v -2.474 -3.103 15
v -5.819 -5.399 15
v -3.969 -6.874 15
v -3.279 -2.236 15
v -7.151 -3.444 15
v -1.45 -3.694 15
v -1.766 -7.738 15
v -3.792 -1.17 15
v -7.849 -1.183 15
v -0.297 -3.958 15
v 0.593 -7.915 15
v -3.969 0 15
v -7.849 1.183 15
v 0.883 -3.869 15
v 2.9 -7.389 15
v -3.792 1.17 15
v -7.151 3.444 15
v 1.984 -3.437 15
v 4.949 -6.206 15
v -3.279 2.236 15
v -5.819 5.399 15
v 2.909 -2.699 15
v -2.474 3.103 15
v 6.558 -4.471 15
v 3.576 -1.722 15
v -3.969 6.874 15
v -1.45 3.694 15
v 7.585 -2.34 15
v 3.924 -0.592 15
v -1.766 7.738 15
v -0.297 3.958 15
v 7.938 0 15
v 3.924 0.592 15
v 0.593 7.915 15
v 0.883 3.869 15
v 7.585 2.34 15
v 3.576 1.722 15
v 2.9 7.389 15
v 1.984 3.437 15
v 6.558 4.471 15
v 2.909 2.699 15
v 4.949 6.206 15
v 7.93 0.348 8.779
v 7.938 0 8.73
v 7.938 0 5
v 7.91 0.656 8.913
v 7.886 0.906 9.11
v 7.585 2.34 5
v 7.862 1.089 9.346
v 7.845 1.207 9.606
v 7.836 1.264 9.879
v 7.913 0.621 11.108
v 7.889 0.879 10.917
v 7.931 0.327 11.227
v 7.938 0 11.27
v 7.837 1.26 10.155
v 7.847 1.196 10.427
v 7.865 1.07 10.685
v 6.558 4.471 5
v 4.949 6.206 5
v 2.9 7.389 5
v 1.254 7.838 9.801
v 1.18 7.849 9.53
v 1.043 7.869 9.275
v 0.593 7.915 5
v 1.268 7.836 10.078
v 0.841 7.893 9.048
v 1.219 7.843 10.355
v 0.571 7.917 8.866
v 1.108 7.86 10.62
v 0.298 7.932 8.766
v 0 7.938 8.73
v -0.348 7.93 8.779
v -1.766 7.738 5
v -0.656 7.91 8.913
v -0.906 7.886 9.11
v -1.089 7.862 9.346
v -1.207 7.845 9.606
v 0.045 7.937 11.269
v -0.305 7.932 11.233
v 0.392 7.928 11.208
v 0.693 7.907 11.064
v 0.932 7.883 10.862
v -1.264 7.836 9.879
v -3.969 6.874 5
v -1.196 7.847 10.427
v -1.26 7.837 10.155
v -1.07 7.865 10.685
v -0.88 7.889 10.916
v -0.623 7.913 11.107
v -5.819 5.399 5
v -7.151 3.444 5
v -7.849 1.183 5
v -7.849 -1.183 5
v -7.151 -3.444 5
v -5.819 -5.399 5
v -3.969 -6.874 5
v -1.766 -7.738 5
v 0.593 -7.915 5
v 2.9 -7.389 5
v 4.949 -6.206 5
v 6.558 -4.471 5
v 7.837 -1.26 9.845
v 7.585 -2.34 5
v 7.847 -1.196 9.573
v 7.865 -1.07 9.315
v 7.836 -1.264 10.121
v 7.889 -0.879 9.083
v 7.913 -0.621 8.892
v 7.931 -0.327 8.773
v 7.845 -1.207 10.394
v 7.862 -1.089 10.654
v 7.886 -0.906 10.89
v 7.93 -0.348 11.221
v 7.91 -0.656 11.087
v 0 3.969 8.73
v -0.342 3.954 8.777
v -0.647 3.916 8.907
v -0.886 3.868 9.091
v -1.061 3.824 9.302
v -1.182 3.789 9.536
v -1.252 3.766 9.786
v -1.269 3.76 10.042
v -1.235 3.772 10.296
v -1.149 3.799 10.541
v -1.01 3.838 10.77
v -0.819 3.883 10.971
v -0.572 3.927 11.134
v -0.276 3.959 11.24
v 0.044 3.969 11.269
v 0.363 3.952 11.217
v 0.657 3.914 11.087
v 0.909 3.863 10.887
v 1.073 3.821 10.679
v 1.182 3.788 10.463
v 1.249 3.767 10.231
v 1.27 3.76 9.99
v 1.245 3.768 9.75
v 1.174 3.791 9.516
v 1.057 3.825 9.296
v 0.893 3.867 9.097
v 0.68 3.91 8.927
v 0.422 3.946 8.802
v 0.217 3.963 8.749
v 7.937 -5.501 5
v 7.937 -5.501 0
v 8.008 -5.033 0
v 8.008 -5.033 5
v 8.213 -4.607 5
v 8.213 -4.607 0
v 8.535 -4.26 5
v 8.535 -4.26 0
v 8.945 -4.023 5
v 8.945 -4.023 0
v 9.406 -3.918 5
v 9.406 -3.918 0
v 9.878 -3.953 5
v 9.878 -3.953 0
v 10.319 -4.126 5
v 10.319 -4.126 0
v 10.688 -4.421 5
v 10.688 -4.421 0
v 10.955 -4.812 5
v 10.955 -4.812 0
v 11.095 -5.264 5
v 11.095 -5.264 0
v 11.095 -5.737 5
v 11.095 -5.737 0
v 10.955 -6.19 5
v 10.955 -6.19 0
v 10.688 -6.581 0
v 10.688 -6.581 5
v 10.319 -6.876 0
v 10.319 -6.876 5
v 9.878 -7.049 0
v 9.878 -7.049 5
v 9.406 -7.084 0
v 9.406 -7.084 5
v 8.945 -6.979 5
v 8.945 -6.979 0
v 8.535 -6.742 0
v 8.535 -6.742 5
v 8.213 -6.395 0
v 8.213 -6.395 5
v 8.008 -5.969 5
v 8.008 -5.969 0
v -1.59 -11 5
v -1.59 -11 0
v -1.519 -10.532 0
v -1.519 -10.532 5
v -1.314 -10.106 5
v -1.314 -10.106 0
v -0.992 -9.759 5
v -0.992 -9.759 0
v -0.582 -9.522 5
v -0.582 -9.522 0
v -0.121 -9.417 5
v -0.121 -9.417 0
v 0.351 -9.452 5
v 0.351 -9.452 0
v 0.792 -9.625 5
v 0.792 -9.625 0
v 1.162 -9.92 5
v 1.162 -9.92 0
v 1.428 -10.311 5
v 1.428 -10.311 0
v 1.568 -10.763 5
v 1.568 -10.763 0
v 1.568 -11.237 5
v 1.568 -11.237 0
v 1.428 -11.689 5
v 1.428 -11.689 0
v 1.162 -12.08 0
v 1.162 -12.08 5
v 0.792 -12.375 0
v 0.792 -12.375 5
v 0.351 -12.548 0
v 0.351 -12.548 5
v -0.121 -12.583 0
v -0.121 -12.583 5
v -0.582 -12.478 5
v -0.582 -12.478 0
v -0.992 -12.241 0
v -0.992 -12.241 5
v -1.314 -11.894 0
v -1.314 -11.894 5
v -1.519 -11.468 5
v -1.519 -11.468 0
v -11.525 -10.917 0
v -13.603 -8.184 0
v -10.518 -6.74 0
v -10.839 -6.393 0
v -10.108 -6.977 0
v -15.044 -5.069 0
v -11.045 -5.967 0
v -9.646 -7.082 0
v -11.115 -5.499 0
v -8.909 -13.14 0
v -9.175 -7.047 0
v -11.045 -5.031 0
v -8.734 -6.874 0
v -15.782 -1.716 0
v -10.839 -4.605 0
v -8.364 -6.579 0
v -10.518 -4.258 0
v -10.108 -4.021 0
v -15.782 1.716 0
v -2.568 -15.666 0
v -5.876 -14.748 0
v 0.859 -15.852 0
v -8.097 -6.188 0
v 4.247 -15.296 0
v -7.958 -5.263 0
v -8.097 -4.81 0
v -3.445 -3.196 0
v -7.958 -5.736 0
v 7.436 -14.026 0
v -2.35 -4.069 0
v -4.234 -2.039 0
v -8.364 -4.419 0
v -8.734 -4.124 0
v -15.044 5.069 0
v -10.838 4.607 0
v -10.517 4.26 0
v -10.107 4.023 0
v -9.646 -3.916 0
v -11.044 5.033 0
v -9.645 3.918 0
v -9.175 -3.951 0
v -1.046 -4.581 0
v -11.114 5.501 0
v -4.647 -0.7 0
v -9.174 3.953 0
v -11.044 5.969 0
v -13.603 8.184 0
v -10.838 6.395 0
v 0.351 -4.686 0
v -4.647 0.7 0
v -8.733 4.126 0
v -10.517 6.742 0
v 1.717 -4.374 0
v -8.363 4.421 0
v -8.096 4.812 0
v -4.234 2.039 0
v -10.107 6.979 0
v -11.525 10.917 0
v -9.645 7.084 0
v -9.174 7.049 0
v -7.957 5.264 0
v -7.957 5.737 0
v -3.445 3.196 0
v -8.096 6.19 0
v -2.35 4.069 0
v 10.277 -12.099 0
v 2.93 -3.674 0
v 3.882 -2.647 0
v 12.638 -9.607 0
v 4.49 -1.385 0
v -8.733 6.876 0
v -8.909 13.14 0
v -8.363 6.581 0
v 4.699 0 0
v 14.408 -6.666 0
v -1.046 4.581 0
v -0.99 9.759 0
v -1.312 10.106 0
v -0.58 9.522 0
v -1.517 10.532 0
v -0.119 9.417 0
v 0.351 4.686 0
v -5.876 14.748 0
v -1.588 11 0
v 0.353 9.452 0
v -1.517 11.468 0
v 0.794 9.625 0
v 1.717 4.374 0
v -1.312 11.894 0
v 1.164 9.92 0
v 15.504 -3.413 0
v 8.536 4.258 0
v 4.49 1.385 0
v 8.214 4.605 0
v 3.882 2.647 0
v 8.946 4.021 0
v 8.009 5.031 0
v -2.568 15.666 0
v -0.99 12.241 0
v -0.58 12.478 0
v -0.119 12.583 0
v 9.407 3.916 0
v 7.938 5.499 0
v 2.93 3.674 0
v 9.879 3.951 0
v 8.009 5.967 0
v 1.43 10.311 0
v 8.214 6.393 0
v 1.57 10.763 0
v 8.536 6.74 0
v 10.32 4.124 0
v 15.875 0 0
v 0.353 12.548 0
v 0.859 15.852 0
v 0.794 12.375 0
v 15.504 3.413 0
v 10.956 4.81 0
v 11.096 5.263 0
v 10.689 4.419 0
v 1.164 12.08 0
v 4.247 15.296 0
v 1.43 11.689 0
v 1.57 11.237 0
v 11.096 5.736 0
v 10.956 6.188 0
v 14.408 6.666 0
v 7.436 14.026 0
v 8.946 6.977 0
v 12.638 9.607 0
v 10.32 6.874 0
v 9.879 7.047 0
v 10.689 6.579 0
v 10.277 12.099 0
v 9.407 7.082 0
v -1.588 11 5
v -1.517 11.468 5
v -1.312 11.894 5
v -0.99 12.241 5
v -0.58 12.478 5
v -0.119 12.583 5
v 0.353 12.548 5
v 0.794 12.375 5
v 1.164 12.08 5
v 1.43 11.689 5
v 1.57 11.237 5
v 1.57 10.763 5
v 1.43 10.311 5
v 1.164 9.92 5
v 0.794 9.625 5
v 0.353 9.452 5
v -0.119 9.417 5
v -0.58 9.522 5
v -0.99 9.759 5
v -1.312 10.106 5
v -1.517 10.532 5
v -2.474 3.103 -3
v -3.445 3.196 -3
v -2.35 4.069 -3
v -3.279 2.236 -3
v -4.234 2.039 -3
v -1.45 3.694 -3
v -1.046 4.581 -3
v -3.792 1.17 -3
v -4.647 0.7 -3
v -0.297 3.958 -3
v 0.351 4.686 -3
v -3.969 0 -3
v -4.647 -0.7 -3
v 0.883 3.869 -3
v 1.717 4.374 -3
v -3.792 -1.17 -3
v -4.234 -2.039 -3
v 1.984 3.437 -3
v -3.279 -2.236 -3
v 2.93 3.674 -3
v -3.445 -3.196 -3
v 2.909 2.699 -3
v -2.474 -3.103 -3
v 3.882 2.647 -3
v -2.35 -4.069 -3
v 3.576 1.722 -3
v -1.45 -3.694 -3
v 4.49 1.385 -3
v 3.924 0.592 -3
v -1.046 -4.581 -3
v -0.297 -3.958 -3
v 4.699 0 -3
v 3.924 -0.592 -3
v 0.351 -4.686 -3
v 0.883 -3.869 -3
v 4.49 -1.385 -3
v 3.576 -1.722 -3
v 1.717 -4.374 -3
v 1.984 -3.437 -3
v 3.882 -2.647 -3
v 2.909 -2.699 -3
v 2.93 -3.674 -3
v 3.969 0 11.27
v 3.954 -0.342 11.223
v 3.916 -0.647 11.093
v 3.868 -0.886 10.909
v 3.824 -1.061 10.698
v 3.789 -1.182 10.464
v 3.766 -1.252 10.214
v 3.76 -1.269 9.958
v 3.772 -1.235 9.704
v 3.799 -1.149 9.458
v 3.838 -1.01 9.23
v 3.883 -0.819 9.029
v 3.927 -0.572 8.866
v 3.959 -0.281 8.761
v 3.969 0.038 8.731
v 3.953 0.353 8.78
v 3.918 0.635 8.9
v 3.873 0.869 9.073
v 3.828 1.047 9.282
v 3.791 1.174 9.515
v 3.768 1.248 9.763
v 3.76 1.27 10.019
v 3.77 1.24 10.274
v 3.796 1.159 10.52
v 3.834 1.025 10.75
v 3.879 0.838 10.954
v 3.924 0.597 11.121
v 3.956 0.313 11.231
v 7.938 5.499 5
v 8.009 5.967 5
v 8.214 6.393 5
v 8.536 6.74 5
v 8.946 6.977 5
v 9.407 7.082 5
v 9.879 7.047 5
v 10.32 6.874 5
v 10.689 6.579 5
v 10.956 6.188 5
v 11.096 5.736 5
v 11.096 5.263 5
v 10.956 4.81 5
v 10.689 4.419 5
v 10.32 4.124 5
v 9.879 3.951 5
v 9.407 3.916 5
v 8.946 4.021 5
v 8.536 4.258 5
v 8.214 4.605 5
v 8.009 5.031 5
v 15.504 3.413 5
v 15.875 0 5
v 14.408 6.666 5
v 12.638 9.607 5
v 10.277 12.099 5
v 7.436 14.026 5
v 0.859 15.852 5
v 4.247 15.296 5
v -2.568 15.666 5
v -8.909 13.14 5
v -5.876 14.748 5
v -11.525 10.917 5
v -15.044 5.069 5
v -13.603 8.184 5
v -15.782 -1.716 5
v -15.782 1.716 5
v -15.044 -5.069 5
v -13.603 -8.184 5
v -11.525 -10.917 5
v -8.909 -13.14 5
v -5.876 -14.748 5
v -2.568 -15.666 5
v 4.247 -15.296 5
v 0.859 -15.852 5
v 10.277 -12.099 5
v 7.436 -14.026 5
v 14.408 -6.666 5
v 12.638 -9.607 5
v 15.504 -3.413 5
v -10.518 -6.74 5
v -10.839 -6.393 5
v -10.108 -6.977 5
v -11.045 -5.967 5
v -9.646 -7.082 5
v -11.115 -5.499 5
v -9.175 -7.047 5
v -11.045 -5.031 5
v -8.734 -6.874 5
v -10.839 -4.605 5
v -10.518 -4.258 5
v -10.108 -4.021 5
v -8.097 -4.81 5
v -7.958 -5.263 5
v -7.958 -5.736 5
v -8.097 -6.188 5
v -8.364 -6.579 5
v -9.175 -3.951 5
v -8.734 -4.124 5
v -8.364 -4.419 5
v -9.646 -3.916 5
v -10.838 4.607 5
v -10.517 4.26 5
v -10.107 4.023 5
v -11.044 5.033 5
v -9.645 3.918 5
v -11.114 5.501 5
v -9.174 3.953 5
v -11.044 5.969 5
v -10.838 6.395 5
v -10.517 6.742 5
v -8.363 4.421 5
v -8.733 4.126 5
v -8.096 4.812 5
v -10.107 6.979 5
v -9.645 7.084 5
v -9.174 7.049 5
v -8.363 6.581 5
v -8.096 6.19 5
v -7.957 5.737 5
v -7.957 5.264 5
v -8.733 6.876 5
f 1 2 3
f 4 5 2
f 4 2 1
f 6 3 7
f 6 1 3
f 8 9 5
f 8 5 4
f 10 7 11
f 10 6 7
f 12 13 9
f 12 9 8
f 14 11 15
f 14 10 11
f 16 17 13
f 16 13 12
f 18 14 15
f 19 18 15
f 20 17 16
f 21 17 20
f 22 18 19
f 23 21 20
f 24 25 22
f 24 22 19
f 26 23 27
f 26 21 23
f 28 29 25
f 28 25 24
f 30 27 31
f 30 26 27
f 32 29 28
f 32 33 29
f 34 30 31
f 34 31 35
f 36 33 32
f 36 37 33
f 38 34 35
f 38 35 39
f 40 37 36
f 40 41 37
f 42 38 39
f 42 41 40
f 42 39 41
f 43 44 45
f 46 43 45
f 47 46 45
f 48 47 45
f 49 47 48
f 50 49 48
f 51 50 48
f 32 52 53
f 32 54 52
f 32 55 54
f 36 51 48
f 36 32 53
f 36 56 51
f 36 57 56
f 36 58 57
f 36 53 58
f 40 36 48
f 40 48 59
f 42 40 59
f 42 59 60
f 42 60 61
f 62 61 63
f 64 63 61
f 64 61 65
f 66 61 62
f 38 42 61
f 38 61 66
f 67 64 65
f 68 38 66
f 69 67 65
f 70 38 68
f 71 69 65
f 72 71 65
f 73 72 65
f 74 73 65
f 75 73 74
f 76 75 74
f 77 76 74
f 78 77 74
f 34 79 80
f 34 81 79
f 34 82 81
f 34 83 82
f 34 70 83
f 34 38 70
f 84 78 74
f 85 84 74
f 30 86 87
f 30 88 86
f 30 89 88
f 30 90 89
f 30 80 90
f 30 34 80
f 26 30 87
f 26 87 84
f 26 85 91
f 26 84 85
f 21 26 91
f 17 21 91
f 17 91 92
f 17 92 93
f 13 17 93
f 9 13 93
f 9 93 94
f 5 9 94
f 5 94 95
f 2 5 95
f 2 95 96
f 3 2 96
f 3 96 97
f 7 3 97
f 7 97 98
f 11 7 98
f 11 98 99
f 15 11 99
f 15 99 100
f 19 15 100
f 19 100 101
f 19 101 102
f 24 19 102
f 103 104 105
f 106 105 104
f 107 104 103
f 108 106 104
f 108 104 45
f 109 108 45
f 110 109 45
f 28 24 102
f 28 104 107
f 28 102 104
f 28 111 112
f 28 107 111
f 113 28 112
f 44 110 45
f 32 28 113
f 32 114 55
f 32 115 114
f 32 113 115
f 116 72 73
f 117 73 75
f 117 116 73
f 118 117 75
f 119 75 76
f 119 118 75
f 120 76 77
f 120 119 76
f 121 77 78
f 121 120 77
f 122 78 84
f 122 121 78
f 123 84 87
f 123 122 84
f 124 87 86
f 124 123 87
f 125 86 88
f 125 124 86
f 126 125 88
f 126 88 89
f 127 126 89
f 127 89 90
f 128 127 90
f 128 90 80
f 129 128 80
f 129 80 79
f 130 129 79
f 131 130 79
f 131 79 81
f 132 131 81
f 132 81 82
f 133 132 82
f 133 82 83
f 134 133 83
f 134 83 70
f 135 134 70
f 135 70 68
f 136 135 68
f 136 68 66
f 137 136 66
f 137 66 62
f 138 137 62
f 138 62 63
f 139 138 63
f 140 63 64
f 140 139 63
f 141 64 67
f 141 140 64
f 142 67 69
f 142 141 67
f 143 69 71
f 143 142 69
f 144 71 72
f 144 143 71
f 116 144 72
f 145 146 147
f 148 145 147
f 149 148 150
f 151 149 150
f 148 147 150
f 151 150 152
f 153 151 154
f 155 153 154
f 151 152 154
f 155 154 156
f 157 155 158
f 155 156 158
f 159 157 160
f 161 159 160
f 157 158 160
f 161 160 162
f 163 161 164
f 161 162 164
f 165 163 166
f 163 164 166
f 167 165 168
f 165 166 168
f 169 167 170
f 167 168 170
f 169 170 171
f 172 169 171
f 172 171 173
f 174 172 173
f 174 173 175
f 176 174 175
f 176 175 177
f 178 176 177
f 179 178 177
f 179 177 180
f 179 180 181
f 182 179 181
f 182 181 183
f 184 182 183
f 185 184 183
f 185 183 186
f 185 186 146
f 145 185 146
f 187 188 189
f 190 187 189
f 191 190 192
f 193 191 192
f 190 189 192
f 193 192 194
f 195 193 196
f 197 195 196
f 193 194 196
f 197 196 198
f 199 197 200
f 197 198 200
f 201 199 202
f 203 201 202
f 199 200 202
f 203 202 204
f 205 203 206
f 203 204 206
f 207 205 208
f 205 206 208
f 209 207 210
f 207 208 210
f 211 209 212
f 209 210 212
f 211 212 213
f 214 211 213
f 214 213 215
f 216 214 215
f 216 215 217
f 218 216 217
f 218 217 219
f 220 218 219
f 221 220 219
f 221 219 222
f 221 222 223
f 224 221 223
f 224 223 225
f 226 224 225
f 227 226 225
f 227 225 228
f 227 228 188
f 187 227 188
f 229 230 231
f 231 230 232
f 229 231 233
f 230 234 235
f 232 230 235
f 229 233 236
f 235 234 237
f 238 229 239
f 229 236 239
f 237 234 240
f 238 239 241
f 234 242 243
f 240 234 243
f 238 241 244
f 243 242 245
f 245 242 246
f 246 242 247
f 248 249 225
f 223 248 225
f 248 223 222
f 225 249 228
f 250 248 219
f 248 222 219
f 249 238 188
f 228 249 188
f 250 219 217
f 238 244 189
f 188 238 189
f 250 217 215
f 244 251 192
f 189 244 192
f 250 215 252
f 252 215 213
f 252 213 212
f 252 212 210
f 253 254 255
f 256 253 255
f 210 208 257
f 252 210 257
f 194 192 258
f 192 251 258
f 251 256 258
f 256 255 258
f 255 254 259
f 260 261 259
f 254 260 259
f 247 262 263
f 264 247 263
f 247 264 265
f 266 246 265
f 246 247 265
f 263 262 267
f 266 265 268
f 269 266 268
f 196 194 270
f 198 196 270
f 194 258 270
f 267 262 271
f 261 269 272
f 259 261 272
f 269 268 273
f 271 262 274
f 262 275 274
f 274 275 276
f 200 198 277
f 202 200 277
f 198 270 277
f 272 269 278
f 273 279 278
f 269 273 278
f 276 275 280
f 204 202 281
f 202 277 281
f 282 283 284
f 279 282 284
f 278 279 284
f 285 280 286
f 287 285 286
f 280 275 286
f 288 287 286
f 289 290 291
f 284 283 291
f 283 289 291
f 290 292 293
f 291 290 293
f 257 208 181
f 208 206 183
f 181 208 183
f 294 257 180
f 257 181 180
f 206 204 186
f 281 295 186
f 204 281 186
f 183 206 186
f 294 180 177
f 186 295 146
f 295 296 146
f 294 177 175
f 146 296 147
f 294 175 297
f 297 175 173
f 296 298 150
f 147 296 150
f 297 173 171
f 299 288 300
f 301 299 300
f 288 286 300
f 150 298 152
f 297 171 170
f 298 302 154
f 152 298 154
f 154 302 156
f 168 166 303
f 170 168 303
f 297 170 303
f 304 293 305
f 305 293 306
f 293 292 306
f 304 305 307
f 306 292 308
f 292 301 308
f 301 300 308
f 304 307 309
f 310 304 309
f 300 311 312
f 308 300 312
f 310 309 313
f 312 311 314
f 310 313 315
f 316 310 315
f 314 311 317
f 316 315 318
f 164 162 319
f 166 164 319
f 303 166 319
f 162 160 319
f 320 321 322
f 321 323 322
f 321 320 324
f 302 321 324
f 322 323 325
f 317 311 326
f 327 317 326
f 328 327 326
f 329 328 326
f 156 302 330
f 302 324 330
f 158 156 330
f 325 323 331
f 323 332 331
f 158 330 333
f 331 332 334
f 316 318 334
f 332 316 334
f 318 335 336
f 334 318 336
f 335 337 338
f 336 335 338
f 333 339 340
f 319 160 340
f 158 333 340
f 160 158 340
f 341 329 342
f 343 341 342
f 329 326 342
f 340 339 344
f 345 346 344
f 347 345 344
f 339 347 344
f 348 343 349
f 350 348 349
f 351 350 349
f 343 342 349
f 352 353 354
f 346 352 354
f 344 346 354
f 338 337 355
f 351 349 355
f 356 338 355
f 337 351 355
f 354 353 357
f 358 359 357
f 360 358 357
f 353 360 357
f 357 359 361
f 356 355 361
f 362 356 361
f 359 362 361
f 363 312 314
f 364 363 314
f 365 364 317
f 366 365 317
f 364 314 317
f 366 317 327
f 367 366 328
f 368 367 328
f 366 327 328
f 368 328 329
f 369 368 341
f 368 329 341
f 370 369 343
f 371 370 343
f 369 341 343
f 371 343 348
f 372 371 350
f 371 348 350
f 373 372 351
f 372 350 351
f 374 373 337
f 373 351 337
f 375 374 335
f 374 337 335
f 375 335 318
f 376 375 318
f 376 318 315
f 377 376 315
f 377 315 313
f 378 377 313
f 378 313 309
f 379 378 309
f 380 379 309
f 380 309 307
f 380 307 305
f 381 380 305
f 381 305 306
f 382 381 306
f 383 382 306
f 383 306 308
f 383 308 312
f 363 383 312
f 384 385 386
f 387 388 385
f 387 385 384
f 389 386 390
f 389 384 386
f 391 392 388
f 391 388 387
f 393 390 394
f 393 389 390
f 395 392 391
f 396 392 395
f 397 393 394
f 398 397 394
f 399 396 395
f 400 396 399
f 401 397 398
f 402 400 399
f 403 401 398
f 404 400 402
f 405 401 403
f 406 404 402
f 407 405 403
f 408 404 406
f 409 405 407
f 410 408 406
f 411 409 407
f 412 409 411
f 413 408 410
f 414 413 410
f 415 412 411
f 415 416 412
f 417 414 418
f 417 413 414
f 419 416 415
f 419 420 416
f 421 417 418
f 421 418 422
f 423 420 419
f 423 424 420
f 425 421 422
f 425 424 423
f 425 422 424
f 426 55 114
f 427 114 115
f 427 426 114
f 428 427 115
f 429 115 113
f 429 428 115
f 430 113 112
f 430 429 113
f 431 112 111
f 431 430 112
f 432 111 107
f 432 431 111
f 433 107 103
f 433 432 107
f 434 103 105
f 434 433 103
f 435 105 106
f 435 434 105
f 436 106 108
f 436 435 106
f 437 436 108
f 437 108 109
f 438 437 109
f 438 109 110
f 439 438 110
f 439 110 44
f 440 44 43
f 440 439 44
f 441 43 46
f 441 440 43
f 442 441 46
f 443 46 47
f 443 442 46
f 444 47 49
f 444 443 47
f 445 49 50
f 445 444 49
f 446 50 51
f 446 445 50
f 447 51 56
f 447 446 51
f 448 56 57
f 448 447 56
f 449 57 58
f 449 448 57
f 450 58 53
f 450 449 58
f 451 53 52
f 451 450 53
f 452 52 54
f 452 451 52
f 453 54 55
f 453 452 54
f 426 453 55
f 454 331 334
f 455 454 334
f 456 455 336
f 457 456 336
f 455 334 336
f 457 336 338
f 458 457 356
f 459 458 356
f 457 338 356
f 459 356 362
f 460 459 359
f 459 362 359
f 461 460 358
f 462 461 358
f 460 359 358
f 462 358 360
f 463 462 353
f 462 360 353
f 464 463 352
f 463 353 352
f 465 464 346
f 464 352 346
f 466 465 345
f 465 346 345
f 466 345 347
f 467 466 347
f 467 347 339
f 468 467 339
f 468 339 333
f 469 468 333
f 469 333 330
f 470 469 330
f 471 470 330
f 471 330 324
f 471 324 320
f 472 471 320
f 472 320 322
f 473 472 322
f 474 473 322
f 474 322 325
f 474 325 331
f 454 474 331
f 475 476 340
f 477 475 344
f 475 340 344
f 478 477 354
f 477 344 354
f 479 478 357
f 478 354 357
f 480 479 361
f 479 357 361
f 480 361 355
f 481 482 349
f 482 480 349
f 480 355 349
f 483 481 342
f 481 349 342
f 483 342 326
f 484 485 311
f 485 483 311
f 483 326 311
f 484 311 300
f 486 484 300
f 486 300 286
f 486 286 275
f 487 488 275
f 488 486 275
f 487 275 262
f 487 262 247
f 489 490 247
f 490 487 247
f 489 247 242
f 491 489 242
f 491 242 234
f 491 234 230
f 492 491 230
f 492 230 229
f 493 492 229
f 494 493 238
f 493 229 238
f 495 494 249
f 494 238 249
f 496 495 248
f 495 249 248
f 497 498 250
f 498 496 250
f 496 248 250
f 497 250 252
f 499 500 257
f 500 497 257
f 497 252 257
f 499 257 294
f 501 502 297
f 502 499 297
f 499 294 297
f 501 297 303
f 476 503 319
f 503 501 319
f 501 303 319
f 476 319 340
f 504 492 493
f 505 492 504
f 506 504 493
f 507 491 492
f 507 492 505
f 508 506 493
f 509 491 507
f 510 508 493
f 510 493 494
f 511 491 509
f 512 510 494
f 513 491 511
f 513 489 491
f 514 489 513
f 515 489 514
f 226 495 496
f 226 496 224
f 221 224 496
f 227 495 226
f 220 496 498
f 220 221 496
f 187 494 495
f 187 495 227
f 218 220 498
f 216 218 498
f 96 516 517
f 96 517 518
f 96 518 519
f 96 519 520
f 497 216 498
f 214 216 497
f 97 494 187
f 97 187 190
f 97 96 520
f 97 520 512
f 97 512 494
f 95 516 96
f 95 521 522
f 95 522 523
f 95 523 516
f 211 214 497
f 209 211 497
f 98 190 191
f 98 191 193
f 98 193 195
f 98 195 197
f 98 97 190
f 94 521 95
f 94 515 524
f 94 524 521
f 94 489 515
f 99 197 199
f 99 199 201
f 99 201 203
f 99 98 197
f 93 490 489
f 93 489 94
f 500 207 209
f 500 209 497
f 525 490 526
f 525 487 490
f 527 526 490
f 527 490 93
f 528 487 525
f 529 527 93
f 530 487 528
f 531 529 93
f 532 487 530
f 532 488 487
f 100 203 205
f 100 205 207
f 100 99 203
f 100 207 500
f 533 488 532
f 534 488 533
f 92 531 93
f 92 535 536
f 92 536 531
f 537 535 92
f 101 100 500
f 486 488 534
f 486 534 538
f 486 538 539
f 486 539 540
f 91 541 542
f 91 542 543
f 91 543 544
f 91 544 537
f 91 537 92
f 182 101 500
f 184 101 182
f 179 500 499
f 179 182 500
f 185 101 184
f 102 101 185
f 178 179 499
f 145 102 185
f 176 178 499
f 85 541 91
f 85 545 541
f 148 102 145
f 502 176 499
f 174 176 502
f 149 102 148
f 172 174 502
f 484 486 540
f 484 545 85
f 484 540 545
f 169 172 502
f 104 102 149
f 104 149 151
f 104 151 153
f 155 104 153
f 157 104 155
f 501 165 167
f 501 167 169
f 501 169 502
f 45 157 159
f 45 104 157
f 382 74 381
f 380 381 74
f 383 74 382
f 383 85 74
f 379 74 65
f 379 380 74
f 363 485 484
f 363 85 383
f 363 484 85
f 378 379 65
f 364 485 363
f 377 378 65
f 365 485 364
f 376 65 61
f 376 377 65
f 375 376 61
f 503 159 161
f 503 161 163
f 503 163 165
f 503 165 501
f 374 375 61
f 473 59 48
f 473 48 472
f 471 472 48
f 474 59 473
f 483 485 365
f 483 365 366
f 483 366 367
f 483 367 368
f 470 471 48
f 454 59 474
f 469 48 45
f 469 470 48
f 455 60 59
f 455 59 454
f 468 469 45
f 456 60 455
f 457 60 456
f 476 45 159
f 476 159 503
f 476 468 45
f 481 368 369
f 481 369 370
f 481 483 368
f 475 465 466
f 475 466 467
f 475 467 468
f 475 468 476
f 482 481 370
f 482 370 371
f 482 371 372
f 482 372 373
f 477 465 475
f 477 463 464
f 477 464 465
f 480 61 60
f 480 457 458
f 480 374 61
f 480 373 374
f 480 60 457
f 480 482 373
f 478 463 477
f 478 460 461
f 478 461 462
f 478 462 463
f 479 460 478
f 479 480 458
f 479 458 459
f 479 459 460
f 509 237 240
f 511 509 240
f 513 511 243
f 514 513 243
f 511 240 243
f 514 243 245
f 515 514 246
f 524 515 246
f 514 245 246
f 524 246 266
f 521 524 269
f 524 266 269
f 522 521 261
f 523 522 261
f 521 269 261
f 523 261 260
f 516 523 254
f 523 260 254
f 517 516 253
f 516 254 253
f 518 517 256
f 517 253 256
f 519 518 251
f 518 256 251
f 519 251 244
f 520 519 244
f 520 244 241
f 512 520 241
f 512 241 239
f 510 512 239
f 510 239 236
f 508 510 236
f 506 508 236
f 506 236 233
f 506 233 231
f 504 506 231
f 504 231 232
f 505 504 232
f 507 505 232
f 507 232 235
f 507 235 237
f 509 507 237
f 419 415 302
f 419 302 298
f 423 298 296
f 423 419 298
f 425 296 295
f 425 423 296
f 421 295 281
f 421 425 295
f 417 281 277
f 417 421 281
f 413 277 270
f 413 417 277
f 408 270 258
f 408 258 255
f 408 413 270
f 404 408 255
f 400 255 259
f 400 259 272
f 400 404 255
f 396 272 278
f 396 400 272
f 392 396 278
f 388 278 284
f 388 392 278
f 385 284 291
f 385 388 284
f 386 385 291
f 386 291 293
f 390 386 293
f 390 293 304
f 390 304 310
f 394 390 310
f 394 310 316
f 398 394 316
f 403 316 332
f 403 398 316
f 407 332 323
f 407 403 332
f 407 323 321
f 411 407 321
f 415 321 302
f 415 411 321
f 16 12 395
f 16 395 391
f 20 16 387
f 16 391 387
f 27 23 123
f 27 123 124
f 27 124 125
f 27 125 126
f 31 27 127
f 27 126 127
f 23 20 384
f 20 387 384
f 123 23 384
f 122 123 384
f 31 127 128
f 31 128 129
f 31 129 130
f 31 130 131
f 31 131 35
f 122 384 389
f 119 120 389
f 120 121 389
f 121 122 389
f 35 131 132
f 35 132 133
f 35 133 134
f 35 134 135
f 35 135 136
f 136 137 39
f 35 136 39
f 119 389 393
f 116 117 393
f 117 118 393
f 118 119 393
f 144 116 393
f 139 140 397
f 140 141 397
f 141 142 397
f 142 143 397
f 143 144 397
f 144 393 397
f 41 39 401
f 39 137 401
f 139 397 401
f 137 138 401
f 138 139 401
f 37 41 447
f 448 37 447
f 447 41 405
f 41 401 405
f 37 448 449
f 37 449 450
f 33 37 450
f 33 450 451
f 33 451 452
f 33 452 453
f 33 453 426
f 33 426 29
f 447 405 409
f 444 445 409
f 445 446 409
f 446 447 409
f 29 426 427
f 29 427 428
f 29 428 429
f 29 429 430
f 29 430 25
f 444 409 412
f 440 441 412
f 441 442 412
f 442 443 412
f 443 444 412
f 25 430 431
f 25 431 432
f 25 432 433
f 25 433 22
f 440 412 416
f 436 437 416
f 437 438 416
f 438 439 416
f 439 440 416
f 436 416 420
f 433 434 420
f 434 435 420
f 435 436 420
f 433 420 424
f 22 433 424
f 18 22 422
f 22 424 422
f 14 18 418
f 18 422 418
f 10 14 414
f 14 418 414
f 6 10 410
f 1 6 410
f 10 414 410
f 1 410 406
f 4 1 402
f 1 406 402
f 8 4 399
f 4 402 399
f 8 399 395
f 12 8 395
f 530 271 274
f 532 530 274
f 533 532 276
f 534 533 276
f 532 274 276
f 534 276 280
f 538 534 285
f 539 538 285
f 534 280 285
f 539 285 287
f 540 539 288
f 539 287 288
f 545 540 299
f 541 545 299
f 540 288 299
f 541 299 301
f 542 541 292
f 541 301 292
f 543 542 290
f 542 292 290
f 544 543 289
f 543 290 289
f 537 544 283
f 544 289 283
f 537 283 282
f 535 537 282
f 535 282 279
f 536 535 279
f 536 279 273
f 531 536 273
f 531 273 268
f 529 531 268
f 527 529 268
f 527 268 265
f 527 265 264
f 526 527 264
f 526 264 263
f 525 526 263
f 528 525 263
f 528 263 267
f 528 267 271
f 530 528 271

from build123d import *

# Parameters (mm, degrees)
SKETCH1_R           = 15.875
BOSS_EXTRUDE1_DEPTH = 15
SKETCH2_R           = 25.391657194
SKETCH2_R_2         = 7.9375
CUT_EXTRUDE1_DEPTH  = 10
SKETCH3_R           = 3.96875
CUT_EXTRUDE2_DEPTH  = 28.000578698
BOSS_EXTRUDE2_START = 3
SKETCH4_R           = 4.699
SKETCH4_R_2         = 3.96875
BOSS_EXTRUDE2_DEPTH = 3
SKETCH5_R           = 1.5875
CUT_EXTRUDE3_DEPTH  = 28.000578698
SKETCH6_R           = 1.27
CUT_EXTRUDE4_DEPTH  = 28.000578698
SKETCH7_R           = 1.27
CUT_EXTRUDE5_DEPTH  = 28.000578753


with BuildPart() as part:
    # Sketch1 → Boss-Extrude1 (new body)
    with BuildSketch(Plane.XY):
        Circle(SKETCH1_R)
    extrude(amount=BOSS_EXTRUDE1_DEPTH)

    # Sketch2 → Cut-Extrude1 (cut)
    with BuildSketch(Plane.XY.offset(15)):
        Circle(SKETCH2_R)
        Circle(SKETCH2_R_2, mode=Mode.SUBTRACT)
    extrude(amount=-CUT_EXTRUDE1_DEPTH, mode=Mode.SUBTRACT)

    # Sketch3 → Cut-Extrude2 (cut, through all)
    with BuildSketch(Plane(origin=(0, 0, 0), x_dir=(-1, 0, 0), z_dir=(0, 0, -1))):
        Circle(SKETCH3_R)
    extrude(amount=-CUT_EXTRUDE2_DEPTH, mode=Mode.SUBTRACT)

    # Sketch4 → Boss-Extrude2 (add)
    with BuildSketch(Plane(origin=(0, 0, 0), x_dir=(-1, 0, 0), z_dir=(0, 0, -1)).offset(BOSS_EXTRUDE2_START)):
        with Locations(Location((0, 0, 0), (0, 0, 180))):
            Circle(SKETCH4_R)
        Circle(SKETCH4_R_2, mode=Mode.SUBTRACT)
    extrude(amount=-BOSS_EXTRUDE2_DEPTH)

    # Sketch5 → Cut-Extrude3 (cut, through all)
    with BuildSketch(Plane(origin=(0, 0, 0), x_dir=(-1, 0, 0), z_dir=(0, 0, -1))):
        with Locations((0, 11)):
            Circle(SKETCH5_R)
        with Locations((9.526779442, 5.500866025)):
            Circle(SKETCH5_R)
        with Locations((9.527779442, -5.499133975)):
            Circle(SKETCH5_R)
        with Locations((0.002, -11)):
            Circle(SKETCH5_R)
        with Locations((-9.524779442, -5.500866025)):
            Circle(SKETCH5_R)
        with Locations((-9.525779442, 5.499133975)):
            Circle(SKETCH5_R)
    extrude(amount=-CUT_EXTRUDE3_DEPTH, mode=Mode.SUBTRACT)

    # Sketch6 → Cut-Extrude4 (cut, through all)
    with BuildSketch(Plane(origin=(0, 0, 0), x_dir=(1, 0, 0), z_dir=(0, 1, 0))):
        with Locations(Location((0, -10, 0), (0, 0, 90))):
            Circle(SKETCH6_R)
    extrude(amount=CUT_EXTRUDE4_DEPTH, mode=Mode.SUBTRACT)

    # Sketch7 → Cut-Extrude5 (cut, through all)
    with BuildSketch(Plane(origin=(0, 0, 0), x_dir=(0, 0, -1), z_dir=(1, 0, 0))):
        with Locations(Location((-10, 0, 0), (0, 0, 180))):
            Circle(SKETCH7_R)
    extrude(amount=CUT_EXTRUDE5_DEPTH, mode=Mode.SUBTRACT)


solid = part.part
